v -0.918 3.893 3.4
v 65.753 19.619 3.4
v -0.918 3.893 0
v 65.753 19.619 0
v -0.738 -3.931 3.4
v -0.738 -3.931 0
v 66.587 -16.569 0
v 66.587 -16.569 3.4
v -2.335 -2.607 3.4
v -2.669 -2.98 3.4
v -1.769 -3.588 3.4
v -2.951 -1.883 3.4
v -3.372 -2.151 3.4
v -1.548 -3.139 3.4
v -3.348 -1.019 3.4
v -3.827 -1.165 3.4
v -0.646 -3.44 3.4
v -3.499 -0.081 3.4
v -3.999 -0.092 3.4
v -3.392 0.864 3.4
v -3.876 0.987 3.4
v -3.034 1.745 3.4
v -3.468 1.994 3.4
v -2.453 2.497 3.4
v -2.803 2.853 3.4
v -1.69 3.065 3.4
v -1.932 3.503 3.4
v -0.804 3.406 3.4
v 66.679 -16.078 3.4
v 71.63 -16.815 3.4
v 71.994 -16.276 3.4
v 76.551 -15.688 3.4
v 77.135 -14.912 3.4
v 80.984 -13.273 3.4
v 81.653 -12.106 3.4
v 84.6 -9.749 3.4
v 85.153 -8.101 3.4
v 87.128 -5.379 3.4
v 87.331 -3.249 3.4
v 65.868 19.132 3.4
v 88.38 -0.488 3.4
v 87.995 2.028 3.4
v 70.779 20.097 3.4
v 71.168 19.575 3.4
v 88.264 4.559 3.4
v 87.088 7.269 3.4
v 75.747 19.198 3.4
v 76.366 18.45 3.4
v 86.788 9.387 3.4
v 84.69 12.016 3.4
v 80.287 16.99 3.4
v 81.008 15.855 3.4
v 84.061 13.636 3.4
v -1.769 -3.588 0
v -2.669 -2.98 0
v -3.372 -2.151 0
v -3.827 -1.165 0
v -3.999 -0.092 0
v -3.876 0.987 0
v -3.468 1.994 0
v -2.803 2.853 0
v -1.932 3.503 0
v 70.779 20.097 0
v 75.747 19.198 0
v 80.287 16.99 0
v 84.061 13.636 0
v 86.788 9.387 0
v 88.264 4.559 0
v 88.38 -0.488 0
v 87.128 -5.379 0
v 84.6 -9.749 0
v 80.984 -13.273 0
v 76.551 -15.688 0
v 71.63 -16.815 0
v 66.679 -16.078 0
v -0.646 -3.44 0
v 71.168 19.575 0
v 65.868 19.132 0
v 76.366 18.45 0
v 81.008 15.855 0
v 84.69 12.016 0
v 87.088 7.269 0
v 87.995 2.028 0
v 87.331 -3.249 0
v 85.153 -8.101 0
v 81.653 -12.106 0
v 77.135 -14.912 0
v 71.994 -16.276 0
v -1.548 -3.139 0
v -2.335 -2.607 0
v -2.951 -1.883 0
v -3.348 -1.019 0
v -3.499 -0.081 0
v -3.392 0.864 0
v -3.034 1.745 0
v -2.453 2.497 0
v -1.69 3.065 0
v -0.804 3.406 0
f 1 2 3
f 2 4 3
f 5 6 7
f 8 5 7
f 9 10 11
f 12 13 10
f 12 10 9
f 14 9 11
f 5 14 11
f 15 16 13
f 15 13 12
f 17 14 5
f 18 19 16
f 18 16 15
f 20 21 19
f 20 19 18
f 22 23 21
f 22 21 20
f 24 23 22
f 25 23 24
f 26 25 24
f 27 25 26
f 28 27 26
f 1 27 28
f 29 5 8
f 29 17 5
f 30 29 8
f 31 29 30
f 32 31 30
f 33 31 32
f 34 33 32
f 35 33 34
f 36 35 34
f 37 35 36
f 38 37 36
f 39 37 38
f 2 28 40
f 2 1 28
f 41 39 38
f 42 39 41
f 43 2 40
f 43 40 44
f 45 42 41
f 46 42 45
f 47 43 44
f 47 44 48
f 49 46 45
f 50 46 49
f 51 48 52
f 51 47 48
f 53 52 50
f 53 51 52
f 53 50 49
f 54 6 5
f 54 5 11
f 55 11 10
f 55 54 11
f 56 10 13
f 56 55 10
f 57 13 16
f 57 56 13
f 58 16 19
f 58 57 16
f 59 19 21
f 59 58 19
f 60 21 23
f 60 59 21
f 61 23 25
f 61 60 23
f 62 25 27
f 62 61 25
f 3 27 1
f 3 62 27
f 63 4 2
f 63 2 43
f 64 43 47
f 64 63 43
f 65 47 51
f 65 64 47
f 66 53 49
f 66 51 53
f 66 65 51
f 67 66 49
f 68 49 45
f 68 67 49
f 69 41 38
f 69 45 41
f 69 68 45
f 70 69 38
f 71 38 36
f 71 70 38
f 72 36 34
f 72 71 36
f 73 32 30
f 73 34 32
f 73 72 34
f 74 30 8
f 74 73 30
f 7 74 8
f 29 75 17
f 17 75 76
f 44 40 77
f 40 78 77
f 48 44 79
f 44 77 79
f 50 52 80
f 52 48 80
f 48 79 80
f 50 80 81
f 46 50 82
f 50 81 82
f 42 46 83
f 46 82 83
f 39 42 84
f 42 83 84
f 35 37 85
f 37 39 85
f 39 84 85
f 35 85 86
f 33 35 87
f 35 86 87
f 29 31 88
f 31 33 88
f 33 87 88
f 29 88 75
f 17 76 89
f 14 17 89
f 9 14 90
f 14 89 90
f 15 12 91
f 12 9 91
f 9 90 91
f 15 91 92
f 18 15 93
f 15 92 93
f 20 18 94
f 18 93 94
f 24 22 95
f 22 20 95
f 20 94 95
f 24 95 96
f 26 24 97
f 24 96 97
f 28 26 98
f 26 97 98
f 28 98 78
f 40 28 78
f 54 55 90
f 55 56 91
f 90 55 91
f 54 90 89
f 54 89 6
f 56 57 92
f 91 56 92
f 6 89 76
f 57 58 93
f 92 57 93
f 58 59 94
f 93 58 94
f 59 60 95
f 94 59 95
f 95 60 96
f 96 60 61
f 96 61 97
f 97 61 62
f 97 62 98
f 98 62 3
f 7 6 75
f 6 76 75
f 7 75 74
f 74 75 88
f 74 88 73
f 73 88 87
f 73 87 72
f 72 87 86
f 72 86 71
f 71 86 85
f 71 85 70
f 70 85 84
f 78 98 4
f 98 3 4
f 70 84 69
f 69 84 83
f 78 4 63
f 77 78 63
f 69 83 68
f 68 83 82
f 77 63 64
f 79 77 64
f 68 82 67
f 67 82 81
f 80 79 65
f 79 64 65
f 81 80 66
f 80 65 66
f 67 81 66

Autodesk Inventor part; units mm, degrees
ref_plane "YZ Plane" through (0, 0, 0) normal (1, 0, 0) x (0, 1, 0)
ref_plane "XZ Plane" through (0, 0, 0) normal (0, 1, 0) x (-1, 0, 0)
ref_plane "XY Plane" through (0, 0, 0) normal (0, 0, 1) x (1, 0, 0)
sketch "Sketch1" plane through (0, 0, 0) normal (0, 0, 1) x (1, 0, 0)
  arc A0 (-0.8035, 3.4065) -> (-0.6457, -3.4399) centre (0, 0) ccw
  arc A1 (66.6791, -16.0777) -> (65.8677, 19.1325) centre (70, 1.6133) ccw
  line L0 (-0.8035, 3.4065) -> (65.8677, 19.1325)
  line L1 (66.6791, -16.0777) -> (-0.6457, -3.4399)
  line L2 (0, 0) -> (70, 1.6133) construction
  line L3 (65.7529, 19.6192) -> (-0.9183, 3.8932)
  arc A2 (-0.9183, 3.8932) -> (-0.738, -3.9313) centre (0, 0) ccw
  line L4 (-0.738, -3.9313) -> (66.5869, -16.5692)
  arc A3 (66.5869, -16.5692) -> (65.7529, 19.6192) centre (70, 1.6133) ccw
  circle A4 centre (0, 0) radius 3.5 construction
  circle A5 centre (70, 1.6133) radius 18 construction
  dimension "d0" = 0.5
extrude "Extrusion1" add sketch "Sketch1" along normal blind 3.4
properties part number "Rubberband"
